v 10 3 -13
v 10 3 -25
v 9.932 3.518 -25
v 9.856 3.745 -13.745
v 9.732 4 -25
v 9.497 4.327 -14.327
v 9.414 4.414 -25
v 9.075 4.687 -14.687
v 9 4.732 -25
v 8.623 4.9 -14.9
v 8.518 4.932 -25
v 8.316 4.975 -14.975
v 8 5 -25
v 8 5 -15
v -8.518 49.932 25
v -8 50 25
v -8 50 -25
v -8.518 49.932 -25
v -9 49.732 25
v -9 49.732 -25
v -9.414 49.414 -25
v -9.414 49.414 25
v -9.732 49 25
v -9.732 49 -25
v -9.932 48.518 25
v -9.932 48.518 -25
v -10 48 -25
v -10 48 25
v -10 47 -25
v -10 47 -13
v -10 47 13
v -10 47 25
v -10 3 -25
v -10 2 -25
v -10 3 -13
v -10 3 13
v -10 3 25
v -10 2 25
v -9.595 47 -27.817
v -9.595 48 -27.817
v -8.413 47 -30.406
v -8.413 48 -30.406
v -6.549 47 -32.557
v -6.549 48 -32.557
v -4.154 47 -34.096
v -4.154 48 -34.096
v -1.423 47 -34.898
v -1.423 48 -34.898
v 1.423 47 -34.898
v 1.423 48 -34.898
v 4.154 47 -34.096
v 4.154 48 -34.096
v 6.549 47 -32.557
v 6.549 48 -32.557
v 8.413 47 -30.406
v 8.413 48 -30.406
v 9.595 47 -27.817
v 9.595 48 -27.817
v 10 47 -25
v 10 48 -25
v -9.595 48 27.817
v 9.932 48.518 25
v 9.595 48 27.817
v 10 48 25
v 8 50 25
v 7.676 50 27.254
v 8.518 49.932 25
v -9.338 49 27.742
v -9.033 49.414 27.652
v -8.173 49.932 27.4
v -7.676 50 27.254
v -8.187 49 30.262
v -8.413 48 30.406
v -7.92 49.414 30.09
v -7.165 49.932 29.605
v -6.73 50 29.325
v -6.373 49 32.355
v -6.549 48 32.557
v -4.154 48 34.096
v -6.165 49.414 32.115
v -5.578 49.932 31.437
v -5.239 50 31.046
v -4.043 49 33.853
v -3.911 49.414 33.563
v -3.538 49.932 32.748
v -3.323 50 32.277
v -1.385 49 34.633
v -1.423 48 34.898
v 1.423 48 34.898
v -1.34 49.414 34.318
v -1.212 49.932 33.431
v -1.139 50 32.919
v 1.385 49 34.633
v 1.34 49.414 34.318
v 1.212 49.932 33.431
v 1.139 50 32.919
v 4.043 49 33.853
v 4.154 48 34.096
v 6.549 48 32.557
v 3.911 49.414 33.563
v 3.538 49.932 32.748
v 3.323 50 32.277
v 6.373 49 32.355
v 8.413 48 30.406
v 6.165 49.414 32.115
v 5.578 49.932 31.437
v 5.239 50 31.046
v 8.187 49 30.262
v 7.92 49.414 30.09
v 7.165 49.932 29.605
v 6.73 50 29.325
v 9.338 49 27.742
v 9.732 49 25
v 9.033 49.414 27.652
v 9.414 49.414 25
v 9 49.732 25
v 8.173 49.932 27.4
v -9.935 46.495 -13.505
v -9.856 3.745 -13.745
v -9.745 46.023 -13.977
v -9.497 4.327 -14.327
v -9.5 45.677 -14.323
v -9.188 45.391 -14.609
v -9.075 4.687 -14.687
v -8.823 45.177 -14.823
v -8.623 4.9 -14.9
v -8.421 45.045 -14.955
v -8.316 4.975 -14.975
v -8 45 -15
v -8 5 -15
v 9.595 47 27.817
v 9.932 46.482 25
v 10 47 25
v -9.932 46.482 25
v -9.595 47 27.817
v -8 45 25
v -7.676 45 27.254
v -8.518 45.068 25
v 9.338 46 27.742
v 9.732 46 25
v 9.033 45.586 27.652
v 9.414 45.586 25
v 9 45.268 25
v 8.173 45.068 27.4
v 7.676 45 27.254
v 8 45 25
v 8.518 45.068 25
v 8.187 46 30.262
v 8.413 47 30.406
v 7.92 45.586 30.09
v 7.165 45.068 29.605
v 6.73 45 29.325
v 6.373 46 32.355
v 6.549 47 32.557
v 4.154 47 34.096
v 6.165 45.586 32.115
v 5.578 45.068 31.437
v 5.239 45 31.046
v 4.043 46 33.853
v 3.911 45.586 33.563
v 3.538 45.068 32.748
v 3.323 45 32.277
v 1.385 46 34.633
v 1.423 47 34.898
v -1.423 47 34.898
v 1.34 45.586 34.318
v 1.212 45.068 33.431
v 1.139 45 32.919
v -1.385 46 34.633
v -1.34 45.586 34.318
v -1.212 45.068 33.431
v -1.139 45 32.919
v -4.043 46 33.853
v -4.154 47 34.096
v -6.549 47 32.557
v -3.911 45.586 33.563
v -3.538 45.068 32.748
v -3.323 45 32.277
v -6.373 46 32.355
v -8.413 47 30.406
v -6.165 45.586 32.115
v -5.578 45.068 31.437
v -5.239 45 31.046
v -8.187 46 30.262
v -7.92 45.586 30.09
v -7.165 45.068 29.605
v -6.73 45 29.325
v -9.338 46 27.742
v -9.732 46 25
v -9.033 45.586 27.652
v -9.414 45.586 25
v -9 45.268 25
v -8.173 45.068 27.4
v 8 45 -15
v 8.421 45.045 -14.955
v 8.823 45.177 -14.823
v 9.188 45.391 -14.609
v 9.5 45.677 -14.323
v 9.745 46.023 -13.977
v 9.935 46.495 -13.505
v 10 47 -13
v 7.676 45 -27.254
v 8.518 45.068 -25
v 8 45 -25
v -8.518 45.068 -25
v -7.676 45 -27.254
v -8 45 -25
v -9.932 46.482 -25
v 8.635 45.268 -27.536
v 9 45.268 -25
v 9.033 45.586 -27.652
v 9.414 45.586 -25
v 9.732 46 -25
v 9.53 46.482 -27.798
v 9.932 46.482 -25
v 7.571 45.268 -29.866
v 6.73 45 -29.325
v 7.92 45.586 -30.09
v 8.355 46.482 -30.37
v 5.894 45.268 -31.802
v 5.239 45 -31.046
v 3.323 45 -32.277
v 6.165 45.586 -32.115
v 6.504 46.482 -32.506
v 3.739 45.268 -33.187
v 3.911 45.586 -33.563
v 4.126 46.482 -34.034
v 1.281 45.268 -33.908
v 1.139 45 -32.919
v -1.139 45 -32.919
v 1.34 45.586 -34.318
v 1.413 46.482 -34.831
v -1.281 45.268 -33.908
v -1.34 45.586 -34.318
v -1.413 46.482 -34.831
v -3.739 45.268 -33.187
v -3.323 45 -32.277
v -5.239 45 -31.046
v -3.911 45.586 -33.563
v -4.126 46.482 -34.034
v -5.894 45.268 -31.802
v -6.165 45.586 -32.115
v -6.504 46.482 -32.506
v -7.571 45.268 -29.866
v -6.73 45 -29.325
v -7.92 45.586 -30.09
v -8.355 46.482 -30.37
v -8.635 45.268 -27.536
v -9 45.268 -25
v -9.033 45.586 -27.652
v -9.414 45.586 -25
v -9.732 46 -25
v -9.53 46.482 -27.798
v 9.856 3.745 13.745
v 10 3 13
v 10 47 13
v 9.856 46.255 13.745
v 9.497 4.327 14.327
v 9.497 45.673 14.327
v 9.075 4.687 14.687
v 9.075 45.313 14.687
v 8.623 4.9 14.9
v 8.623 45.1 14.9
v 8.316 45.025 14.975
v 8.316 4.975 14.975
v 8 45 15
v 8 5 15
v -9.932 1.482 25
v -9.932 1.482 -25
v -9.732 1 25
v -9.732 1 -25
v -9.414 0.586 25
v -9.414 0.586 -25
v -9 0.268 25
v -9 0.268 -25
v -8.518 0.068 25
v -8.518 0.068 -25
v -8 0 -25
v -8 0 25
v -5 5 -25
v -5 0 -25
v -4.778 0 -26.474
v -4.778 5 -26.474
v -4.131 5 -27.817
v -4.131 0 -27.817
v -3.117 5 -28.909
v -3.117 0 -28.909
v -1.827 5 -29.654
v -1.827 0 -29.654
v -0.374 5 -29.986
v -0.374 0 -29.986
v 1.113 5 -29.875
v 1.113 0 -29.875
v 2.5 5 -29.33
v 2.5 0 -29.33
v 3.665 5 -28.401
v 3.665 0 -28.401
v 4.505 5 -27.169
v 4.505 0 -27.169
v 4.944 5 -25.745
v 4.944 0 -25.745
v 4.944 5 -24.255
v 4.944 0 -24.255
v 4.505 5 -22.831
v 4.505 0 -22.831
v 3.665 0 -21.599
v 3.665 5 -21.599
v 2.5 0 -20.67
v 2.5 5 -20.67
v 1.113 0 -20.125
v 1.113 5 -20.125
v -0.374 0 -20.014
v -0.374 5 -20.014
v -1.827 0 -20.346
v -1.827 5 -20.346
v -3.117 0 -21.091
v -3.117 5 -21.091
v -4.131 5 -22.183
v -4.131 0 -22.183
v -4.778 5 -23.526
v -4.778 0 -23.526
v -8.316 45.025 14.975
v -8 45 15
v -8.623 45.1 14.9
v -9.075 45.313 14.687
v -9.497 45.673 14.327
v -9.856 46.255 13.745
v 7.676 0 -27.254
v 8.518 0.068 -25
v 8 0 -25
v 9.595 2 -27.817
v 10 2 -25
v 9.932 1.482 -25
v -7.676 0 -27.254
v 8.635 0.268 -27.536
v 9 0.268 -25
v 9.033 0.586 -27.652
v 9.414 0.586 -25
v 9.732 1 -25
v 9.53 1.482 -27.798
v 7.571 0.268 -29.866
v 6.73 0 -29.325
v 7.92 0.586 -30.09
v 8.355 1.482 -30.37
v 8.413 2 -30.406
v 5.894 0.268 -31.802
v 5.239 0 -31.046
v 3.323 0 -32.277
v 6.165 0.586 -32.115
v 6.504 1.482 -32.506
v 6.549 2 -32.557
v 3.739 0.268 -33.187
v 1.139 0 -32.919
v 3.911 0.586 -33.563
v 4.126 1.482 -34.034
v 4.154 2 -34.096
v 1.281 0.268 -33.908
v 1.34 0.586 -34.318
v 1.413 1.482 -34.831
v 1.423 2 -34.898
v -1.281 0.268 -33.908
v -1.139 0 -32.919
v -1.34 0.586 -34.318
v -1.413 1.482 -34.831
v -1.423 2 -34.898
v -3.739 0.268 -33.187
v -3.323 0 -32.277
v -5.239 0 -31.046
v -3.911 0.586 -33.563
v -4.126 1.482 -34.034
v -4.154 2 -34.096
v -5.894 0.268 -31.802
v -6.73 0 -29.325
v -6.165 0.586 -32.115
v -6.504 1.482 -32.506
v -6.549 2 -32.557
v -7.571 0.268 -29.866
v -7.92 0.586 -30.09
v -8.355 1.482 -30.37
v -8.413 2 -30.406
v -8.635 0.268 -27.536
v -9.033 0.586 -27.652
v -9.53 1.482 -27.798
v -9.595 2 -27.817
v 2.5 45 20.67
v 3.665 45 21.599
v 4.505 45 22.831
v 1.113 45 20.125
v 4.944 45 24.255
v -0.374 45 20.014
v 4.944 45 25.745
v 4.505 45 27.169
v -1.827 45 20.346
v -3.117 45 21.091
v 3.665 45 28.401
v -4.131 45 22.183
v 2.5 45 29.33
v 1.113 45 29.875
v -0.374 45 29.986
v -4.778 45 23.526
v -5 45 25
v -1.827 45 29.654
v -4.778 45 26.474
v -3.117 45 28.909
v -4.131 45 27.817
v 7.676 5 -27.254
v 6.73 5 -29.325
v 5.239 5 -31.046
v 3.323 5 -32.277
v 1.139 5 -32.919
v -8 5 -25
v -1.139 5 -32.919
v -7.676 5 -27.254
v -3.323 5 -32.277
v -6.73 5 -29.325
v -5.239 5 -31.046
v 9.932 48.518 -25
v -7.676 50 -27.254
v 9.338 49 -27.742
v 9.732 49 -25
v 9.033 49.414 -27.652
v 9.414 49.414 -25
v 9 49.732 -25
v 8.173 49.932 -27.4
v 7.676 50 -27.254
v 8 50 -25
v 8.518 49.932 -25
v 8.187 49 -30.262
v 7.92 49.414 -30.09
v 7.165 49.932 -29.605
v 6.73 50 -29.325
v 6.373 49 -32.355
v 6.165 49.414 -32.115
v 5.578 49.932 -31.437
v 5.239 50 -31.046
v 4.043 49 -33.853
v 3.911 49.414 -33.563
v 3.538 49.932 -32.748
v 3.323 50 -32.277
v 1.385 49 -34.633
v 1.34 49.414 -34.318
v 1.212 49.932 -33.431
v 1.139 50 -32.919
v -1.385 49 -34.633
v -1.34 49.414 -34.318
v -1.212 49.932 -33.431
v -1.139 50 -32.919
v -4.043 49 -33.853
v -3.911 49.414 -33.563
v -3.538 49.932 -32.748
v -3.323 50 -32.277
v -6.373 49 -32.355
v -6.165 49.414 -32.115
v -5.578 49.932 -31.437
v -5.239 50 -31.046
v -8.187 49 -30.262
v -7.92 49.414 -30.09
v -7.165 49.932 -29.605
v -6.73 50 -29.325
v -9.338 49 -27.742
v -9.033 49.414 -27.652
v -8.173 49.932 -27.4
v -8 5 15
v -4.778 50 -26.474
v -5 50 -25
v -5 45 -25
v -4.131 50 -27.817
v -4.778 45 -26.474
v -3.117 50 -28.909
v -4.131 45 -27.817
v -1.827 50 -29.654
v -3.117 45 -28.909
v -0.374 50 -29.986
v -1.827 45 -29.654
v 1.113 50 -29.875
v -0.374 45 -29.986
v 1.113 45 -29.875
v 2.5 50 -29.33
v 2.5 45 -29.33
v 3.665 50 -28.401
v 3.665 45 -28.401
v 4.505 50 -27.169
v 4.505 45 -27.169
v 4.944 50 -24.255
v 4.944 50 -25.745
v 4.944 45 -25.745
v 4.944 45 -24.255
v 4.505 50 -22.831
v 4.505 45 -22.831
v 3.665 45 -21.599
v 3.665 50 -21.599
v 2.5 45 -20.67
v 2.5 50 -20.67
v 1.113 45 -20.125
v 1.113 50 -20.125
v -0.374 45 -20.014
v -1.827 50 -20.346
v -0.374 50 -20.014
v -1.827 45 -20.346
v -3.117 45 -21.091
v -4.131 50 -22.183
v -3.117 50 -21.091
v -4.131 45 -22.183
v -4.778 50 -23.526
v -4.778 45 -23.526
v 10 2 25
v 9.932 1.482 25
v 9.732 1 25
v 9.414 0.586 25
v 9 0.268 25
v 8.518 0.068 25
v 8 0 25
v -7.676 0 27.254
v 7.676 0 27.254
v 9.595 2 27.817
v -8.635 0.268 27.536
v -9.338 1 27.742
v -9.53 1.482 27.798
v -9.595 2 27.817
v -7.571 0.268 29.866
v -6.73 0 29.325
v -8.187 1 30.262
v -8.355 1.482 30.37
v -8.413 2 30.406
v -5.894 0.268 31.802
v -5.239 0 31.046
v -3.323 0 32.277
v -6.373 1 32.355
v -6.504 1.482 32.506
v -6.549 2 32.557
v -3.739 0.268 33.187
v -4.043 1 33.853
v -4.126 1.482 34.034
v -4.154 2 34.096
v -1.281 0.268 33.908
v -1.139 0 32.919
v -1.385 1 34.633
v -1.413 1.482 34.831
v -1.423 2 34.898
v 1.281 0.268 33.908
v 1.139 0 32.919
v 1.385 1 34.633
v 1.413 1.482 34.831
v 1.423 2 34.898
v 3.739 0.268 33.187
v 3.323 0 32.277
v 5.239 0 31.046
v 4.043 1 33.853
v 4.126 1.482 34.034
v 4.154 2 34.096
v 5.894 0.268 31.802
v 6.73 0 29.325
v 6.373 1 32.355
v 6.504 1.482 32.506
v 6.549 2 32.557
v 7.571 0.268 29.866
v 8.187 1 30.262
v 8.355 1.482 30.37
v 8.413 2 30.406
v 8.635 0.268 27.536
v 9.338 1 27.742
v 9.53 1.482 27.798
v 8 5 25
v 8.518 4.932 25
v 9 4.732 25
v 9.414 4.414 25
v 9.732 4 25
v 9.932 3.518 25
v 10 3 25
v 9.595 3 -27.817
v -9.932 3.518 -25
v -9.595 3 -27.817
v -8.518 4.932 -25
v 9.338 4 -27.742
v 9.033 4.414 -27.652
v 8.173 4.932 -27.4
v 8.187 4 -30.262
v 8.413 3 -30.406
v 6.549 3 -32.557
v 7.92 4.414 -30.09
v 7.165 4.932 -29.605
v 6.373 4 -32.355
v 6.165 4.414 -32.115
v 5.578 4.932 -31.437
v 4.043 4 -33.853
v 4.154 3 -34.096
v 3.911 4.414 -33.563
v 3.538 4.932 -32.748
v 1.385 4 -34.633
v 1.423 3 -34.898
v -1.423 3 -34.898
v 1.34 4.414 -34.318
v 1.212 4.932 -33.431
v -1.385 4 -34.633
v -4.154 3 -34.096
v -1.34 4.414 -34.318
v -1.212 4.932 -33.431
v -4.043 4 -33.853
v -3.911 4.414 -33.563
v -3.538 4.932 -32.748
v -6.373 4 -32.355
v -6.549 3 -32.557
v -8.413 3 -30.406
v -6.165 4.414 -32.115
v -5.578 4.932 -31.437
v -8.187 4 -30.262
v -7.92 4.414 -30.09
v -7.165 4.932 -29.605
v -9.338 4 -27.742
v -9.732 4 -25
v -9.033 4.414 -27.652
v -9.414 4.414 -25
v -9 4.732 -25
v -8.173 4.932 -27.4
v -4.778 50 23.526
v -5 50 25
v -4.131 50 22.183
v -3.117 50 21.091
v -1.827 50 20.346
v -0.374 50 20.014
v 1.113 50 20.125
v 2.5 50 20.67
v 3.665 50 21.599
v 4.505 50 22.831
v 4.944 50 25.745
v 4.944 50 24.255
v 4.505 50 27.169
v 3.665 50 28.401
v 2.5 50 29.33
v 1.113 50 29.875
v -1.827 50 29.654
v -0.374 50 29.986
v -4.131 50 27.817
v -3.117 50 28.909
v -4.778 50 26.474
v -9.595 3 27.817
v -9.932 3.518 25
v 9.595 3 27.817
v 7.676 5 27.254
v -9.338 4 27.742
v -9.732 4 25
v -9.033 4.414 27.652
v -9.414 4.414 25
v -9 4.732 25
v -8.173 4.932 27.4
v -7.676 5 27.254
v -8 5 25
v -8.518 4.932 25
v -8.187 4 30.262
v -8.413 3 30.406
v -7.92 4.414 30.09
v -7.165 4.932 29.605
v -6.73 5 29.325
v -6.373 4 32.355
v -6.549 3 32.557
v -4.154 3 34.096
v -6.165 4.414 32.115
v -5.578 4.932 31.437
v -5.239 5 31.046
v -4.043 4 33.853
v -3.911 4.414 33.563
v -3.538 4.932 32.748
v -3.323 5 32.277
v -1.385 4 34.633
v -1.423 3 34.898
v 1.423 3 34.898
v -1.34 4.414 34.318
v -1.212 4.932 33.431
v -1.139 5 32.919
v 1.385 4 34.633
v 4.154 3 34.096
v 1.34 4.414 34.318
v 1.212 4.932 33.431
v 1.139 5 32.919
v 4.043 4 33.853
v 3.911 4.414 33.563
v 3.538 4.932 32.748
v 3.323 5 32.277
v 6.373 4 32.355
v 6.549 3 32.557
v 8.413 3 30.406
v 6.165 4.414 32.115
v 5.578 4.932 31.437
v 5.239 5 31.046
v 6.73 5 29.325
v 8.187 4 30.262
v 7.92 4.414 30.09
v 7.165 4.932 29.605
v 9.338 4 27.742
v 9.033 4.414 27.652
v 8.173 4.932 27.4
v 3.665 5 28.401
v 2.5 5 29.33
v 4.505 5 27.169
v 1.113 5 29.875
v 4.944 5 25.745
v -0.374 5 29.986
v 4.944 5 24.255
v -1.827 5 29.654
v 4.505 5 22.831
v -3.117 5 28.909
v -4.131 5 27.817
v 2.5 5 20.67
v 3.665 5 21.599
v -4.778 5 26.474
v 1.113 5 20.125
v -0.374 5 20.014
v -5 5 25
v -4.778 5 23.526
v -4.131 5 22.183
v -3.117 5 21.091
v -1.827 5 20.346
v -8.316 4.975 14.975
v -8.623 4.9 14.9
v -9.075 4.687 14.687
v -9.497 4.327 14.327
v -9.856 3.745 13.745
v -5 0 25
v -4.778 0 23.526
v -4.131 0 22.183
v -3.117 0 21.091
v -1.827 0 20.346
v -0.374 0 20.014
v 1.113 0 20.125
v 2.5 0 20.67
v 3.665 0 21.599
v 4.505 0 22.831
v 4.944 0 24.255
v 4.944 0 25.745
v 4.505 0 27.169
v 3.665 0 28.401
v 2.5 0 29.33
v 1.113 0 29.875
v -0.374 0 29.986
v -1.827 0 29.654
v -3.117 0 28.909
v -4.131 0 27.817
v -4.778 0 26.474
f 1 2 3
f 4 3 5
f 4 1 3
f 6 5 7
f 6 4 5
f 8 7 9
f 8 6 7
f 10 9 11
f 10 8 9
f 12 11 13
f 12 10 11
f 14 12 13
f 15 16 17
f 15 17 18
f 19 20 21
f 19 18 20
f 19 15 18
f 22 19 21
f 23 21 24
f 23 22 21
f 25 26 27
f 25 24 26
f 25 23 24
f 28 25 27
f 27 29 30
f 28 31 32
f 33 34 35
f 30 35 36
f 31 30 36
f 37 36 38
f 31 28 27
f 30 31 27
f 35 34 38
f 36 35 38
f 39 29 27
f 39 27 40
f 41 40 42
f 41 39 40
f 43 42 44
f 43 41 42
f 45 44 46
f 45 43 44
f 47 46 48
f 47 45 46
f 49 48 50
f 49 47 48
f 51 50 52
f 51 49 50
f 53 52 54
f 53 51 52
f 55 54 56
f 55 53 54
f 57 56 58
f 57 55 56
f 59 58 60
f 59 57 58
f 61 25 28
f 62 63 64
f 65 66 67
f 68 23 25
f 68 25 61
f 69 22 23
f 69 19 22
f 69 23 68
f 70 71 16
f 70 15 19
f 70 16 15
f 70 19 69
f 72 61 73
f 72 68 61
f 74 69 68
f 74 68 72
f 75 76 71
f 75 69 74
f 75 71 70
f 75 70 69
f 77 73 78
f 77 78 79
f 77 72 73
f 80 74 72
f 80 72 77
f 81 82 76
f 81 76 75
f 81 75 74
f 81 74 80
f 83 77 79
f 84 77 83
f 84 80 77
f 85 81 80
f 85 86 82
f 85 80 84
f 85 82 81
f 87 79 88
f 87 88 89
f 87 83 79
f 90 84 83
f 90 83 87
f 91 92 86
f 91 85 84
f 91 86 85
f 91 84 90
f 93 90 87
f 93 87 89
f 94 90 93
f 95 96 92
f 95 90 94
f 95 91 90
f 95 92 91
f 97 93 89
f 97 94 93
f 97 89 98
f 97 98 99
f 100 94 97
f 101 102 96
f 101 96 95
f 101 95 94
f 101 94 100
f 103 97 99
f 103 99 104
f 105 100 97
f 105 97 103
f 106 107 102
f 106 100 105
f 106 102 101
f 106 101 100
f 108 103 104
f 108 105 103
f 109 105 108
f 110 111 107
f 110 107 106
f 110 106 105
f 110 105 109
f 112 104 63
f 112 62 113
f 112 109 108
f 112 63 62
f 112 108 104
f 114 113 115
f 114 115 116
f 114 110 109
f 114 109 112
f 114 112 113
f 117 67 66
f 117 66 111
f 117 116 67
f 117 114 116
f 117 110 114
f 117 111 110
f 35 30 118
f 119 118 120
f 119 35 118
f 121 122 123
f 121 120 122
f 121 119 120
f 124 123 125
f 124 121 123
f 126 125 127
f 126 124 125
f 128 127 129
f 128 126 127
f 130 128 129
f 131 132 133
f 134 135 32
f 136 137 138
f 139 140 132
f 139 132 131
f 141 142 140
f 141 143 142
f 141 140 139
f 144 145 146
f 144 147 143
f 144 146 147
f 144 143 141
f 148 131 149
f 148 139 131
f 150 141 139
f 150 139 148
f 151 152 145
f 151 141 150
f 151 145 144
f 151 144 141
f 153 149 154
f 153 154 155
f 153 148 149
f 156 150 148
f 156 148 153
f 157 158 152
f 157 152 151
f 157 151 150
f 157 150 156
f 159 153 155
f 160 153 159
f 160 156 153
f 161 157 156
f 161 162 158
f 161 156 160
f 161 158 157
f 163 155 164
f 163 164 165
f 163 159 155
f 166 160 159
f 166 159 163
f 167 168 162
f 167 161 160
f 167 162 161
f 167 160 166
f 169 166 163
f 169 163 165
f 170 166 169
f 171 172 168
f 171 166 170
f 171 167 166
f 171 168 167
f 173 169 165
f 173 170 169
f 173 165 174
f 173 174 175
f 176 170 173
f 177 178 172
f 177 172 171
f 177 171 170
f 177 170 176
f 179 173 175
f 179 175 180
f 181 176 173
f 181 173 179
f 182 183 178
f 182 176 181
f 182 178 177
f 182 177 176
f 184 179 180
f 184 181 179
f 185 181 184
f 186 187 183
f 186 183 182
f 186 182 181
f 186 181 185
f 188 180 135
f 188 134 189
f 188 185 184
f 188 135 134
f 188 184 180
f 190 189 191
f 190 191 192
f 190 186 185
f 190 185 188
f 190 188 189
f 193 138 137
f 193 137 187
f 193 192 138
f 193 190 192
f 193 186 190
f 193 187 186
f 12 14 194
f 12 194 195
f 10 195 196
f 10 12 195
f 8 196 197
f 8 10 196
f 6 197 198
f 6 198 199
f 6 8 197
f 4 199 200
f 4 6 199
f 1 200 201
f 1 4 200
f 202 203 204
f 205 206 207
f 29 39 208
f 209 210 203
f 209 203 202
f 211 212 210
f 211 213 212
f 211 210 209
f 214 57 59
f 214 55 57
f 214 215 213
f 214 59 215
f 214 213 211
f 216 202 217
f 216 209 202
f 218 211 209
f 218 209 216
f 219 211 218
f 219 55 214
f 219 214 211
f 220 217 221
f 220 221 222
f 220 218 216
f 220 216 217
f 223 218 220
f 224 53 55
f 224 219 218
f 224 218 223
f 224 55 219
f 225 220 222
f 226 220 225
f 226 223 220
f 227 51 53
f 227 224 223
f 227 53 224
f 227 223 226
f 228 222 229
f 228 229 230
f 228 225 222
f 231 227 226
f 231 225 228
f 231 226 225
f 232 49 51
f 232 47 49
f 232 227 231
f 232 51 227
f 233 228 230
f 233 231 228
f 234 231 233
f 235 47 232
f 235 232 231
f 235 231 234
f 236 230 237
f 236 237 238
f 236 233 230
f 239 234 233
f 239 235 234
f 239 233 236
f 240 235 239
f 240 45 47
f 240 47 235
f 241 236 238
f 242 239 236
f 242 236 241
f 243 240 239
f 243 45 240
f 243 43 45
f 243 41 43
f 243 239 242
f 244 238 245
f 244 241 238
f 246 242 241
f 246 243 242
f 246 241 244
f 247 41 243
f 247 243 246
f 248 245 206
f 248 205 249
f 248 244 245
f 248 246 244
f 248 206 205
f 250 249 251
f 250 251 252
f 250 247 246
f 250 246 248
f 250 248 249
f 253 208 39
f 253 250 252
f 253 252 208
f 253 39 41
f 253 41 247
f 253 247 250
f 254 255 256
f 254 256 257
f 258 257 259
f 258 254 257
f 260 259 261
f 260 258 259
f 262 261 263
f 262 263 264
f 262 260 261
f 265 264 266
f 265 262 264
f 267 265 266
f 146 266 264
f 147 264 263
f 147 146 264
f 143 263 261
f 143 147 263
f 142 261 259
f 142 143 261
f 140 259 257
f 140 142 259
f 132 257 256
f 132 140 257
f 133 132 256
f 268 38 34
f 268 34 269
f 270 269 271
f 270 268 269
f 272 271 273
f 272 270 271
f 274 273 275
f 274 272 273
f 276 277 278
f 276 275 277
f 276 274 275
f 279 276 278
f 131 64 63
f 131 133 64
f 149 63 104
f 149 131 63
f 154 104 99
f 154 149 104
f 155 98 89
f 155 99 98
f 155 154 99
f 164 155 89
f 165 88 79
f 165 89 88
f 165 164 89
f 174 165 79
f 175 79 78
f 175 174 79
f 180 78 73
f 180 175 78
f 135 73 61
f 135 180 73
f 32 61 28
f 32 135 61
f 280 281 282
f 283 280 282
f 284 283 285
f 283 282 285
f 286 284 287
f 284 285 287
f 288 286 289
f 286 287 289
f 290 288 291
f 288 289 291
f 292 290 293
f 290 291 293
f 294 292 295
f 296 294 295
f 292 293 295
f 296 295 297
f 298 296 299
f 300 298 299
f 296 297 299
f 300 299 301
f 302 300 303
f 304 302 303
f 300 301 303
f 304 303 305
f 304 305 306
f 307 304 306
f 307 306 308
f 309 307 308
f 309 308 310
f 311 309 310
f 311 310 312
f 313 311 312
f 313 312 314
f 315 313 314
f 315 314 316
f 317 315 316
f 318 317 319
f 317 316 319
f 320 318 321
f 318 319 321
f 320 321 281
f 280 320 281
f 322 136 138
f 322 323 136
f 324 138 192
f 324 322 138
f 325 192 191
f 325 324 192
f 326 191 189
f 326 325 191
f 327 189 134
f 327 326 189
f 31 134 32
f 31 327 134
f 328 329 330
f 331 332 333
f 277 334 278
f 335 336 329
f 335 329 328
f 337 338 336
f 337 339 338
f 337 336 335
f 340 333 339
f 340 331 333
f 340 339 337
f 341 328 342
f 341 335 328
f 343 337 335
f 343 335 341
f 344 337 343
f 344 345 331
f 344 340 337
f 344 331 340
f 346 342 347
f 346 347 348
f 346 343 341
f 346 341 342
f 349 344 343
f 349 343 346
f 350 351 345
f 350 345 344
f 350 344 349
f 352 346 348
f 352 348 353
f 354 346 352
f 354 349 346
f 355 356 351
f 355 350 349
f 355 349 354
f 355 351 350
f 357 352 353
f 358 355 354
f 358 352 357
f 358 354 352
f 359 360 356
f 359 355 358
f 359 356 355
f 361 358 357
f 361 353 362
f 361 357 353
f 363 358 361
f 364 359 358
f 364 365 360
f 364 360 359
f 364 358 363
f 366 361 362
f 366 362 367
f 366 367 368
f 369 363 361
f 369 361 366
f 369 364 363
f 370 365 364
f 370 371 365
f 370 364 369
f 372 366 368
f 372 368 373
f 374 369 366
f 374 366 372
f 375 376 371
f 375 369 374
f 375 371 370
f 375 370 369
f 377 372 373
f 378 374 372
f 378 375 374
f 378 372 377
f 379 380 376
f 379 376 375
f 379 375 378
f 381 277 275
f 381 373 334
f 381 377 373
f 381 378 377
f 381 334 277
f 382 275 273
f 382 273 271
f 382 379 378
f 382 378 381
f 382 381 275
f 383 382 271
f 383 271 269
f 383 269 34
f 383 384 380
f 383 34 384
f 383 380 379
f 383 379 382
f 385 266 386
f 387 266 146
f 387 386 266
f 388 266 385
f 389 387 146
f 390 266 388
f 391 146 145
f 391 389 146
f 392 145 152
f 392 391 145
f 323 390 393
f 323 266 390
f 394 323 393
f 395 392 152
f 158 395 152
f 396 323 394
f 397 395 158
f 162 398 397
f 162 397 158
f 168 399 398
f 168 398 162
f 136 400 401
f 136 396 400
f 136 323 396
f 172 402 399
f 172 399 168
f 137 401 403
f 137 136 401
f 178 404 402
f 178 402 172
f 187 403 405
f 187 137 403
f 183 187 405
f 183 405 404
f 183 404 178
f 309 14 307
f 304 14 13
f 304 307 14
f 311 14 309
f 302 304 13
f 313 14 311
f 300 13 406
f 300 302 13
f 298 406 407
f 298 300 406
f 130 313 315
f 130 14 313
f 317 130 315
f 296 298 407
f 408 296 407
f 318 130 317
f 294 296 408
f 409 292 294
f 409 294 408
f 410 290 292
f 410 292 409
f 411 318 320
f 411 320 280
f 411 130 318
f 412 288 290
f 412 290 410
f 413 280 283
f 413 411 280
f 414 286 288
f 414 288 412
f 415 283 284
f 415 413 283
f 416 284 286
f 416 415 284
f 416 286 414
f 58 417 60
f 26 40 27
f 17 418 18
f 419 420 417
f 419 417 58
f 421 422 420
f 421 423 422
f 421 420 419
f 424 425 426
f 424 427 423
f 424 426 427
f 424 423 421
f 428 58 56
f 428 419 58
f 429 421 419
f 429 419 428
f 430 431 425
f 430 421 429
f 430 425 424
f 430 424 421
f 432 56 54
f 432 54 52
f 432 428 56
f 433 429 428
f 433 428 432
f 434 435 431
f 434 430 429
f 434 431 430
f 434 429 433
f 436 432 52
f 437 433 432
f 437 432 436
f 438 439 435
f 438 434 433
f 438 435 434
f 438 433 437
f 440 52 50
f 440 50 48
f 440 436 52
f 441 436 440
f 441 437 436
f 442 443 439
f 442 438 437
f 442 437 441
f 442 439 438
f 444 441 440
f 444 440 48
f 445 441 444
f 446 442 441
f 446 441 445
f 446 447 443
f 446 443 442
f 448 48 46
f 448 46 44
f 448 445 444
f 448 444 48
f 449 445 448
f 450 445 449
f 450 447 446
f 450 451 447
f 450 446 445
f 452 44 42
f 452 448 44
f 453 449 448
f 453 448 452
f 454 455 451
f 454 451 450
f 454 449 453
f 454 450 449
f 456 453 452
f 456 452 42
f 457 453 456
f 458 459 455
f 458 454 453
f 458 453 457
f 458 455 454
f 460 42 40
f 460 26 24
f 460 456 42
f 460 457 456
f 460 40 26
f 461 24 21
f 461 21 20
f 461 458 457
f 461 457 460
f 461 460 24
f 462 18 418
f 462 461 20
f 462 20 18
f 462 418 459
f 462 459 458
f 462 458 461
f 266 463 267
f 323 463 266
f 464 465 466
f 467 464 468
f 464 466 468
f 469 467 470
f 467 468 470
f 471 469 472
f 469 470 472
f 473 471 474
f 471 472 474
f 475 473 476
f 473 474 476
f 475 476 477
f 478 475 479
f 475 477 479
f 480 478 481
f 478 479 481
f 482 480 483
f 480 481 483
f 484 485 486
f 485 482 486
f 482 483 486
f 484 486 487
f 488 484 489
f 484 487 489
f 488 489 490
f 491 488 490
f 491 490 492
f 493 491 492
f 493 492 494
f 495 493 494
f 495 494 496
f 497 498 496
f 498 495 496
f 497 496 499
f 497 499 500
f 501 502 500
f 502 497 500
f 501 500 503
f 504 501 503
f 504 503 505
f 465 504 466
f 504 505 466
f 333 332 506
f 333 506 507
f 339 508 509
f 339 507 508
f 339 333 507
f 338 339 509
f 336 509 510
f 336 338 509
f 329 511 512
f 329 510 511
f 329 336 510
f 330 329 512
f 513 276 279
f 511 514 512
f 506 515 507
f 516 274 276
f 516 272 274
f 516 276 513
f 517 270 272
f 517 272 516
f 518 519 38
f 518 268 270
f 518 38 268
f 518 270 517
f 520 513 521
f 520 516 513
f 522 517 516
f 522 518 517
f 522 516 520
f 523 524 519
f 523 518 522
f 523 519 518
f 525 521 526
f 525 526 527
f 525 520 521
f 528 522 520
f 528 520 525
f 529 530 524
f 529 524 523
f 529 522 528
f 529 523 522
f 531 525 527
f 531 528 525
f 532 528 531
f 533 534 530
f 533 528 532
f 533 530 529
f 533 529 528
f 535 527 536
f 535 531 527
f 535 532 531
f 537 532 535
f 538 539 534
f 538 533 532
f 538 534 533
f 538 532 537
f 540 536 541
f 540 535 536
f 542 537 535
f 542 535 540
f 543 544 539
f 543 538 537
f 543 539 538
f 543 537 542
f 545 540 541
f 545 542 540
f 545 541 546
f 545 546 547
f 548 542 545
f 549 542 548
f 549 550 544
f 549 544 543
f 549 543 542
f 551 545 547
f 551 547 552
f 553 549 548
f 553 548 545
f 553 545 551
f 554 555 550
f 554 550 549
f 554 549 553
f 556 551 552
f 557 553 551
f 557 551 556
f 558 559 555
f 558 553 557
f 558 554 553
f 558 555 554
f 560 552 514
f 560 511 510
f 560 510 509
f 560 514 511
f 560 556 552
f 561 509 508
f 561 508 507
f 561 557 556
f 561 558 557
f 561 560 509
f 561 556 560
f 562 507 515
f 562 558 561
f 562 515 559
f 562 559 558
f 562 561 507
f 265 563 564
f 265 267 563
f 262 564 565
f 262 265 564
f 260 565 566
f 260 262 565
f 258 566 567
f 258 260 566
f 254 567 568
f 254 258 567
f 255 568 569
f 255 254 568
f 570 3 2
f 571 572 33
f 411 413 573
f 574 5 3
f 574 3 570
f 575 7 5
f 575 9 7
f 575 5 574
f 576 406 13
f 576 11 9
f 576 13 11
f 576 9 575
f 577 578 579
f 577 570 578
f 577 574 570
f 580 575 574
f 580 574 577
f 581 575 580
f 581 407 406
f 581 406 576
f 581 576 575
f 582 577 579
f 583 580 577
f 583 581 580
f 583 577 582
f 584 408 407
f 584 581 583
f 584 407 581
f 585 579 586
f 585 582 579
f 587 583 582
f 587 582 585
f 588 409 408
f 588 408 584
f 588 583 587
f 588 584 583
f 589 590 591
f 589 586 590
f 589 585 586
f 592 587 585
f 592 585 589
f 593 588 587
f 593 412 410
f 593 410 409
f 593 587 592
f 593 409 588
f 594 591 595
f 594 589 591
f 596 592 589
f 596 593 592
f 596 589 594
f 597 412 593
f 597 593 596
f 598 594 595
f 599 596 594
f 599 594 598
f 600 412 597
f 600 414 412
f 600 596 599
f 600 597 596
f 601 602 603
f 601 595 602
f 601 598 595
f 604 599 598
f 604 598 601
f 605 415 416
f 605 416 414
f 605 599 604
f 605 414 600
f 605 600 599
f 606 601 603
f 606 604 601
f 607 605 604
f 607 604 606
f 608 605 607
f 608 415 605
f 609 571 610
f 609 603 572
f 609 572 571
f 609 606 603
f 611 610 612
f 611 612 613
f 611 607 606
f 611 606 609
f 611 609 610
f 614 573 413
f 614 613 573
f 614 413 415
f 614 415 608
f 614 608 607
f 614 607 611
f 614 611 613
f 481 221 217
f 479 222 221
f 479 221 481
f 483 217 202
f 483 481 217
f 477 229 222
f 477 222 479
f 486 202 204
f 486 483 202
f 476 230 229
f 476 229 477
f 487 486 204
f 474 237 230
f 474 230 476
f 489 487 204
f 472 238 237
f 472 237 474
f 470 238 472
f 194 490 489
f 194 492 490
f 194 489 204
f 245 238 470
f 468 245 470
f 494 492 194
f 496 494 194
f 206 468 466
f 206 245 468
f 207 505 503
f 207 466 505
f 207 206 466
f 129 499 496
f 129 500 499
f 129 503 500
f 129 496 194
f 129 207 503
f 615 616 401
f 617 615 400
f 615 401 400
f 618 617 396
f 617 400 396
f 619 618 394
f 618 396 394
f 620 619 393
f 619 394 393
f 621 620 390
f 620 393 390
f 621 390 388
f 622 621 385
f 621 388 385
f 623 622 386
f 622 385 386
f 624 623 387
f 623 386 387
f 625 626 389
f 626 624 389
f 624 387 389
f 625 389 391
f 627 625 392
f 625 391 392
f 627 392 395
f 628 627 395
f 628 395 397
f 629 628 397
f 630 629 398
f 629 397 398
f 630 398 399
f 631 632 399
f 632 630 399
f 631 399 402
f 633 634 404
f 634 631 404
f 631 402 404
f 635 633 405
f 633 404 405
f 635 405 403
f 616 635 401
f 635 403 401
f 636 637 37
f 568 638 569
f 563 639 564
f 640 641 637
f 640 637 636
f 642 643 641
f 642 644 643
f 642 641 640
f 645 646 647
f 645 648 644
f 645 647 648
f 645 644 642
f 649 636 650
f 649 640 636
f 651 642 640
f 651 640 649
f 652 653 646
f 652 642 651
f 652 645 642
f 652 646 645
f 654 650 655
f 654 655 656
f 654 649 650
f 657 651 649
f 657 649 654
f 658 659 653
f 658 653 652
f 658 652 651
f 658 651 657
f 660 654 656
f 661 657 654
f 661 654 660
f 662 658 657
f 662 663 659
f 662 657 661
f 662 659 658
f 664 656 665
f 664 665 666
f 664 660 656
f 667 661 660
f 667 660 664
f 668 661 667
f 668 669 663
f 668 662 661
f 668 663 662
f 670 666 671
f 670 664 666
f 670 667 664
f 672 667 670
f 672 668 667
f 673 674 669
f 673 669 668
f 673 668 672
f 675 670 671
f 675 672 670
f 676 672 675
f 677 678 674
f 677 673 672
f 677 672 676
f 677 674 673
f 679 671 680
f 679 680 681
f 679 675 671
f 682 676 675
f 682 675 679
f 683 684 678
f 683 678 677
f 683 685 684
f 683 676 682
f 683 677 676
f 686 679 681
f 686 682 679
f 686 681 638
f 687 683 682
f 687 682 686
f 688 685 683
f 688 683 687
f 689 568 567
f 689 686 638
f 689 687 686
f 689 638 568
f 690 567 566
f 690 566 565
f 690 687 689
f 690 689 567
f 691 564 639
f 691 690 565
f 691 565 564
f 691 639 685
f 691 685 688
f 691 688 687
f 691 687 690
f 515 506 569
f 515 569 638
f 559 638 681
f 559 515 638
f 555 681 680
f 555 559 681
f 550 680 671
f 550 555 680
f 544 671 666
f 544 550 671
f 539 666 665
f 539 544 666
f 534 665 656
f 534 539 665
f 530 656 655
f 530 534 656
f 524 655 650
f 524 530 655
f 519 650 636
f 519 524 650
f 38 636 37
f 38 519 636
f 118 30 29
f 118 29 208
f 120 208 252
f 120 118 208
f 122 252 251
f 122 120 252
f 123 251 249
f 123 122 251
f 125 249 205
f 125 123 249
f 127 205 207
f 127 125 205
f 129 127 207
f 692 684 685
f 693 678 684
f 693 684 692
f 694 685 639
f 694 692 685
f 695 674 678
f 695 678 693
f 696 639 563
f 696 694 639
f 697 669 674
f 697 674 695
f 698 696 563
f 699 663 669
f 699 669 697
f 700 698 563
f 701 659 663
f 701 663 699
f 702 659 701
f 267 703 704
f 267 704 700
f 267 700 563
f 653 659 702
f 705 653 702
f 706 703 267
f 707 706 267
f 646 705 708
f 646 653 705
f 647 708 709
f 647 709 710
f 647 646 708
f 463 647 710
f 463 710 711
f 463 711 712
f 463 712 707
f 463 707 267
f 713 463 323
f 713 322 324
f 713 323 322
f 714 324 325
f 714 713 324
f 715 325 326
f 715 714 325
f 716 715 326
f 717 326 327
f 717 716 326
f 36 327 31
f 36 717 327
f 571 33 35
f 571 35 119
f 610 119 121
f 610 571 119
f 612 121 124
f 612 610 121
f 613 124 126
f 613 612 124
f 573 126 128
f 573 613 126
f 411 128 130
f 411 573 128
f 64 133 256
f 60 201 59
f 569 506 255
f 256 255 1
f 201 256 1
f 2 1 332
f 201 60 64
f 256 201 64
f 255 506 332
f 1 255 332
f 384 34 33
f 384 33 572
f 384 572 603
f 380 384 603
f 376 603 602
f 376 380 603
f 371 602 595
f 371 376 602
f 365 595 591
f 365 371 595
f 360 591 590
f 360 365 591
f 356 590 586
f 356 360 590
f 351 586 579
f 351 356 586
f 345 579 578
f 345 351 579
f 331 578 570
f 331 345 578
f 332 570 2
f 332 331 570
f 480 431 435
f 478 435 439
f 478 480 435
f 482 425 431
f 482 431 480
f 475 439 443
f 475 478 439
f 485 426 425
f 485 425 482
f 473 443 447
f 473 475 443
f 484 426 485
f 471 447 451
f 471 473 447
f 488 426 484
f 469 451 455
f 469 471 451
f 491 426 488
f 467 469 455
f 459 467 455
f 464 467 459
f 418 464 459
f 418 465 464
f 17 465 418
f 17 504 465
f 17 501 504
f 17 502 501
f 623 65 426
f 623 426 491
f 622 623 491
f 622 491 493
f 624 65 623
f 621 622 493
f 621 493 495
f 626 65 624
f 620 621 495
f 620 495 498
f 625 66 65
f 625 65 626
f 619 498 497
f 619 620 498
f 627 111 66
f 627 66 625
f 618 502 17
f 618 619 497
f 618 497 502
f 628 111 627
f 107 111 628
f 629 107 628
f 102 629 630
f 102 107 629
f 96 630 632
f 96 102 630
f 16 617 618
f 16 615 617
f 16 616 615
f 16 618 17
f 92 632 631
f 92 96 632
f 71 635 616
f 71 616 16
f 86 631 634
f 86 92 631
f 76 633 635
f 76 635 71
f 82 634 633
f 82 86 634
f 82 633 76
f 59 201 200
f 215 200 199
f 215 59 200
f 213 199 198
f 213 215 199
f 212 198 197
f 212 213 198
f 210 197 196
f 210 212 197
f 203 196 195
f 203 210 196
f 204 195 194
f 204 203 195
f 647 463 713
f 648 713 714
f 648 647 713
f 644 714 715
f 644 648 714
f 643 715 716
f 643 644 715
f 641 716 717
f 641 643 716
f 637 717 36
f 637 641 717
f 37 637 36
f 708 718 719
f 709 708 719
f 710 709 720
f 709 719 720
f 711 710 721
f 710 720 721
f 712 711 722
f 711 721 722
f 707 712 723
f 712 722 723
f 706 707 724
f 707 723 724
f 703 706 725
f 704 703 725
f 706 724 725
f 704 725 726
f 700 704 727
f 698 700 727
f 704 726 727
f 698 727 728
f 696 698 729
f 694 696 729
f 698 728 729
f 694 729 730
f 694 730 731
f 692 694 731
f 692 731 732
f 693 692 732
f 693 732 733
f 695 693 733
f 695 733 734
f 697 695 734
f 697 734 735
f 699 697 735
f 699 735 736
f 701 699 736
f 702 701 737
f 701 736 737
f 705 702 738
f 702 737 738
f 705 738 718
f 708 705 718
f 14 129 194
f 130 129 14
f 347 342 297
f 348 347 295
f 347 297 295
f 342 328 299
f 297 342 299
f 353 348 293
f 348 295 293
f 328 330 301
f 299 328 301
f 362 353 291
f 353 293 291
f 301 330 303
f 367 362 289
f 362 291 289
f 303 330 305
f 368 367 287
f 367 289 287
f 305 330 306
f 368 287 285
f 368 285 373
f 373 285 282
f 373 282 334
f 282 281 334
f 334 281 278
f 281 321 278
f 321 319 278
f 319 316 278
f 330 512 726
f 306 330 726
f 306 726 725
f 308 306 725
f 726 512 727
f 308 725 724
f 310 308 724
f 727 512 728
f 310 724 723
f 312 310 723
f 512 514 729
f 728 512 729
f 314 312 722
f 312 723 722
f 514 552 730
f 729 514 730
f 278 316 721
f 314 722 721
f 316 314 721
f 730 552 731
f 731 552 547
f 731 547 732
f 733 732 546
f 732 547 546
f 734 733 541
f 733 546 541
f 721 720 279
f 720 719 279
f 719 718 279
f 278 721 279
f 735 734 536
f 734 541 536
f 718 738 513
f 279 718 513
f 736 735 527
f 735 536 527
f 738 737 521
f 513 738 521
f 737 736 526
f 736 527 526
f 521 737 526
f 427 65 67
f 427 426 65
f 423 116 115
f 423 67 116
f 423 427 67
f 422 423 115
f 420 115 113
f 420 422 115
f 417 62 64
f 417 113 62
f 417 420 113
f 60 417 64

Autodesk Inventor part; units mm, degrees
ref_plane "YZ Plane" through (0, 0, 0) normal (1, 0, 0) x (0, 1, 0)
ref_plane "XZ Plane" through (0, 0, 0) normal (0, 1, 0) x (-1, 0, 0)
ref_plane "XY Plane" through (0, 0, 0) normal (0, 0, 1) x (1, 0, 0)
sketch "Sketch1" plane through (0, 0, 0) normal (0, 1, 0) x (-1, 0, 0)
  line L0 (10, -25) -> (10, 25)
  line L1 (-10, 25) -> (-10, -25)
  arc A0 (10, 25) -> (-10, 25) centre (0, 25) ccw
  arc A1 (-10, -25) -> (10, -25) centre (0, -25) ccw
  circle A2 centre (0, 25) radius 5
  circle A3 centre (0, -25) radius 5
  point P0 (0, 0)
extrude "Extrusion1" add sketch "Sketch1" along normal blind 50
sketch "Sketch2" plane through (-10, 0, -25) normal (-1, 0, 0) x (0, 0, 1)
  line L0 (-10, 0) -> (-10, 50) projected
  line L1 (10, 5) -> (-10, 5)
  line L2 (-10, 5) -> (-10, 45)
  line L3 (-10, 45) -> (10, 45)
  line L4 (10, 45) -> (10, 5)
  line L5 (0, 0) -> (0, 50) projected
  point P0 (25, 0)
  dimension "d6" = 40
extrude "Extrusion2" cut sketch "Sketch2" against normal up to surface (20 mm away)
mirror "Mirror1" about plane through (0, 0, 0) normal (0, 0, 1) of "Extrusion2"
fillet "Fillet1" radius 2 24 edges at (0, 50, -35) (-10, 50, 0) (0, 50, 35) (10, 50, 0) (0, 45, -35) (-10, 45, -20) (10, 45, -20) (10, 25, -15) (10, 25, 15) (10, 45, 20) (-10, 45, 20) (0, 45, 35) (-10, 25, 15) (-10, 5, 20) (10, 5, 20) (0, 5, 35) (10, 0, 0) (0, 0, -35) (-10, 0, 0) (0, 0, 35) (10, 5, -20) (-10, 5, -20) (0, 5, -35) (-10, 25, -15)
properties part number "Link2"
